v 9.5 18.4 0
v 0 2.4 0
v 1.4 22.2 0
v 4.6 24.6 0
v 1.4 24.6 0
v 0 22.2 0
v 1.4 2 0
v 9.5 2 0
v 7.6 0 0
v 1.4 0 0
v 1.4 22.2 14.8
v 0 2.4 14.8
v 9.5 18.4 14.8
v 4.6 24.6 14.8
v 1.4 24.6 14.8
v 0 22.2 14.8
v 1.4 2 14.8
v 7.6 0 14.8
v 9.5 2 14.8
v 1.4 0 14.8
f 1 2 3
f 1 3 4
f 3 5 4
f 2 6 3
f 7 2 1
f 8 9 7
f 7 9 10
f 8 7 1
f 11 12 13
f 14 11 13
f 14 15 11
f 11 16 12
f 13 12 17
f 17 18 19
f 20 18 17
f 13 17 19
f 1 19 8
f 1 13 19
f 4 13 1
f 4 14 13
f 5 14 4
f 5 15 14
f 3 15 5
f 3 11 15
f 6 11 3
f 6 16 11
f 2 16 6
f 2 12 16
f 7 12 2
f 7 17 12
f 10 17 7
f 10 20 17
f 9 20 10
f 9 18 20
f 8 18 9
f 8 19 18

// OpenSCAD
// file: keystone.scad
module keystoneCutout() {
    linear_extrude(14.8) polygon([
        [0,2.4],
        [1.4,2],
        [1.4,0],    
        [7.6,0],
        [9.5,2],
        [9.5,18.4],
        [4.6,24.6],
        [1.4,24.6],
        [1.4,22.2],
        [0,22.2],
    ]);
}

module keystonePort(border=4.1) {
    translate([4,4,0]) difference() {
        linear_extrude(9.5)
            offset(delta=border, chamfer=true)
                square([14.8,24.6]);
        
        translate([14.8,0,0])
            rotate([0,-90,0])
                keystoneCutout();
    }
}
// main file
include <keystone.scad>

Select = 0; // [0:keystoneCutout, 1:keystonePort]

if (Select==0) {
    keystoneCutout();
} else if (Select==1) {
    keystonePort();
}
